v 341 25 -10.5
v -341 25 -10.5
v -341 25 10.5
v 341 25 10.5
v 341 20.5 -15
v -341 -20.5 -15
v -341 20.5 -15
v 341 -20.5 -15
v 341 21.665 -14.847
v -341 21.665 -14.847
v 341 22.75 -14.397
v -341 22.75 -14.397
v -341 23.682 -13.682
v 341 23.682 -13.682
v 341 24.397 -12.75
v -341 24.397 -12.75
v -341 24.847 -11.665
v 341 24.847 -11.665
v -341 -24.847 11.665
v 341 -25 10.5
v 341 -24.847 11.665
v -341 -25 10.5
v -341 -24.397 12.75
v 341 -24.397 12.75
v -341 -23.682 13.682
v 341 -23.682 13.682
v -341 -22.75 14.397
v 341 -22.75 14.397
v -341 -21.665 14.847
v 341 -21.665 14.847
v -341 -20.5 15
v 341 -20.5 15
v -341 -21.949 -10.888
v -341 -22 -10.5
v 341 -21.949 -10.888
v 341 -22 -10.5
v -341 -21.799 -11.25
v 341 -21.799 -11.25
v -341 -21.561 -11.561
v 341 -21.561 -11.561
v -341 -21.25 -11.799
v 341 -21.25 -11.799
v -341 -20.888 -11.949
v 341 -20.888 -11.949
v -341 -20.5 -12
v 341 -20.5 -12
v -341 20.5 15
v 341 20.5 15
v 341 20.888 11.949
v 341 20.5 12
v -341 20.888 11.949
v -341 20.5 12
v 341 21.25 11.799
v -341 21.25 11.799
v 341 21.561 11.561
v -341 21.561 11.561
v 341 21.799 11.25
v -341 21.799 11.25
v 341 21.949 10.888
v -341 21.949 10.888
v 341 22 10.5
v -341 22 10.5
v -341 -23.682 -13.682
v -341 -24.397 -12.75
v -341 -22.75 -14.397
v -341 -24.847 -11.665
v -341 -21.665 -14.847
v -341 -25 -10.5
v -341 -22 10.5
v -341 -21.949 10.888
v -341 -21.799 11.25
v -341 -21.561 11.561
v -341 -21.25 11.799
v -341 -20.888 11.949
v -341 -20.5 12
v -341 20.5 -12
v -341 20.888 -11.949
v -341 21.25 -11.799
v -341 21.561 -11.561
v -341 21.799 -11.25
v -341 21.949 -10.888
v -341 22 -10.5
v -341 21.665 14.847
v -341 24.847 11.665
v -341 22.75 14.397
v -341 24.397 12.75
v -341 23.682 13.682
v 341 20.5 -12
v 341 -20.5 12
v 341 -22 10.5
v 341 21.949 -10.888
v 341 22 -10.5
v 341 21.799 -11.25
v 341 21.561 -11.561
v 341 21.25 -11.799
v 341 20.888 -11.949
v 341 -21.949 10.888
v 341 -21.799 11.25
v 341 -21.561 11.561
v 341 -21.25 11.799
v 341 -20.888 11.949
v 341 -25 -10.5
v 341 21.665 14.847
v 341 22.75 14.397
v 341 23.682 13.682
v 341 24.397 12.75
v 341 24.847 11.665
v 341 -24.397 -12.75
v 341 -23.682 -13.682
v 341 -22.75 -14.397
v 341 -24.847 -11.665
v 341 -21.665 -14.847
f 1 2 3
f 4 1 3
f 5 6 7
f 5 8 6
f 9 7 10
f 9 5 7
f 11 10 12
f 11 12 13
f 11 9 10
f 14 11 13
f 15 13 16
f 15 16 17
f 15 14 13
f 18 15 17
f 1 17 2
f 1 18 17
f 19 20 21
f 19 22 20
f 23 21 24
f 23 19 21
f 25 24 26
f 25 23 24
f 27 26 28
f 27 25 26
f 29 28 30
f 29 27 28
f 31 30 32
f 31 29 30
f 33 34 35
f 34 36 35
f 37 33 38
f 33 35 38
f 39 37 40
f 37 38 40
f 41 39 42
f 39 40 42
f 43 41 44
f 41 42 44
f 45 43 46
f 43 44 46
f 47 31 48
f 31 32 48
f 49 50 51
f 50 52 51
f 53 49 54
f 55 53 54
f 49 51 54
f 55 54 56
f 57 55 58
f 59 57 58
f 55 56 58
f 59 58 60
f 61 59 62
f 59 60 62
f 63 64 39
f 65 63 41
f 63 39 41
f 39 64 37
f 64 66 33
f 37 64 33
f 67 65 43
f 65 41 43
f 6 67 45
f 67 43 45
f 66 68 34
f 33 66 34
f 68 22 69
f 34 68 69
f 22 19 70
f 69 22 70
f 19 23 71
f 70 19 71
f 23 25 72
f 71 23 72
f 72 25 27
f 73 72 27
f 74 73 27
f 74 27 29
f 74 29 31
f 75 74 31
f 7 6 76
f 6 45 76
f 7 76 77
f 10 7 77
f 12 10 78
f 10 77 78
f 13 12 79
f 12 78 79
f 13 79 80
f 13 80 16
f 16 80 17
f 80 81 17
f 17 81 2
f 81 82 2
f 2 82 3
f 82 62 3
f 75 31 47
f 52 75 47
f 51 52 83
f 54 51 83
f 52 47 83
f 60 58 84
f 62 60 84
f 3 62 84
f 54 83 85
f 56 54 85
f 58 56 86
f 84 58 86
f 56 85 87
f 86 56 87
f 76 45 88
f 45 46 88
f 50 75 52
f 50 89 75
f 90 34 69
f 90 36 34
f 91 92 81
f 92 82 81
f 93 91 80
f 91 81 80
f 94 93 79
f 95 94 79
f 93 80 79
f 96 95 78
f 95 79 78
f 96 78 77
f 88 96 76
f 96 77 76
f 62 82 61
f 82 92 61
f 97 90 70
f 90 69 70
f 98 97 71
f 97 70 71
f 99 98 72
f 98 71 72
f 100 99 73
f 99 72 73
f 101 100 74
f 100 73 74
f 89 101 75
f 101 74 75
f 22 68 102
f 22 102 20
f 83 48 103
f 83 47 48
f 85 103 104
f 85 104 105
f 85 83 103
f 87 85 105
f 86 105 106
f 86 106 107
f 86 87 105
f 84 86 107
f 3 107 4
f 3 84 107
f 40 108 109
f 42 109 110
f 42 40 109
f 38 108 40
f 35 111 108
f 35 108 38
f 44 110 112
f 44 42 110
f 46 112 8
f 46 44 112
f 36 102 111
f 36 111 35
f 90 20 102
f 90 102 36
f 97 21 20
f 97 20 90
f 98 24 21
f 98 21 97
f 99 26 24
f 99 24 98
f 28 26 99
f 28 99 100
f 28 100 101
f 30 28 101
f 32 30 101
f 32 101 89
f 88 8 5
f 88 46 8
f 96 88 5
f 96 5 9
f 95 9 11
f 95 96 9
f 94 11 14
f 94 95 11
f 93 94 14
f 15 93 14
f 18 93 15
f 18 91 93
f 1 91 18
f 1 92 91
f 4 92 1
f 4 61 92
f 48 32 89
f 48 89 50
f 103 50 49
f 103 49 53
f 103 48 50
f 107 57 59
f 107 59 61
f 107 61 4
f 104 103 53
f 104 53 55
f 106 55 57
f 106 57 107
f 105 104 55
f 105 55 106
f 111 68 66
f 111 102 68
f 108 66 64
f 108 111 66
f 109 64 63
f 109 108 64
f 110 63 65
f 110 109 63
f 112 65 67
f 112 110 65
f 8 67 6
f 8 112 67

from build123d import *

# Parameters (mm, degrees)
F0_W     = 50
F0_H     = 30
F0_W_2   = 44
F0_H_2   = 24
F1_DEPTH = 341
F2_R     = 1.5
F3_R     = 4.5


with BuildPart() as f1:
    # F0 (on Right) → F1 (new body, symmetric)
    with BuildSketch(Plane.YZ):
        Rectangle(F0_W, F0_H)
        Rectangle(F0_W_2, F0_H_2, mode=Mode.SUBTRACT)
    extrude(amount=F1_DEPTH, both=True)

    # F2
    f2_edges = [f1.edges().sort_by_distance(p)[0] for p in [
        (0, -22, -12),
        (0, -22, 12),
        (0, 22, -12),
        (0, 22, 12),
    ]]
    fillet(f2_edges, radius=F2_R)

    # F3
    f3_edges = [f1.edges().sort_by_distance(p)[0] for p in [
        (0, -25, 15),
        (0, -25, -15),
        (0, 25, -15),
        (0, 25, 15),
    ]]
    fillet(f3_edges, radius=F3_R)


solid = f1.part
